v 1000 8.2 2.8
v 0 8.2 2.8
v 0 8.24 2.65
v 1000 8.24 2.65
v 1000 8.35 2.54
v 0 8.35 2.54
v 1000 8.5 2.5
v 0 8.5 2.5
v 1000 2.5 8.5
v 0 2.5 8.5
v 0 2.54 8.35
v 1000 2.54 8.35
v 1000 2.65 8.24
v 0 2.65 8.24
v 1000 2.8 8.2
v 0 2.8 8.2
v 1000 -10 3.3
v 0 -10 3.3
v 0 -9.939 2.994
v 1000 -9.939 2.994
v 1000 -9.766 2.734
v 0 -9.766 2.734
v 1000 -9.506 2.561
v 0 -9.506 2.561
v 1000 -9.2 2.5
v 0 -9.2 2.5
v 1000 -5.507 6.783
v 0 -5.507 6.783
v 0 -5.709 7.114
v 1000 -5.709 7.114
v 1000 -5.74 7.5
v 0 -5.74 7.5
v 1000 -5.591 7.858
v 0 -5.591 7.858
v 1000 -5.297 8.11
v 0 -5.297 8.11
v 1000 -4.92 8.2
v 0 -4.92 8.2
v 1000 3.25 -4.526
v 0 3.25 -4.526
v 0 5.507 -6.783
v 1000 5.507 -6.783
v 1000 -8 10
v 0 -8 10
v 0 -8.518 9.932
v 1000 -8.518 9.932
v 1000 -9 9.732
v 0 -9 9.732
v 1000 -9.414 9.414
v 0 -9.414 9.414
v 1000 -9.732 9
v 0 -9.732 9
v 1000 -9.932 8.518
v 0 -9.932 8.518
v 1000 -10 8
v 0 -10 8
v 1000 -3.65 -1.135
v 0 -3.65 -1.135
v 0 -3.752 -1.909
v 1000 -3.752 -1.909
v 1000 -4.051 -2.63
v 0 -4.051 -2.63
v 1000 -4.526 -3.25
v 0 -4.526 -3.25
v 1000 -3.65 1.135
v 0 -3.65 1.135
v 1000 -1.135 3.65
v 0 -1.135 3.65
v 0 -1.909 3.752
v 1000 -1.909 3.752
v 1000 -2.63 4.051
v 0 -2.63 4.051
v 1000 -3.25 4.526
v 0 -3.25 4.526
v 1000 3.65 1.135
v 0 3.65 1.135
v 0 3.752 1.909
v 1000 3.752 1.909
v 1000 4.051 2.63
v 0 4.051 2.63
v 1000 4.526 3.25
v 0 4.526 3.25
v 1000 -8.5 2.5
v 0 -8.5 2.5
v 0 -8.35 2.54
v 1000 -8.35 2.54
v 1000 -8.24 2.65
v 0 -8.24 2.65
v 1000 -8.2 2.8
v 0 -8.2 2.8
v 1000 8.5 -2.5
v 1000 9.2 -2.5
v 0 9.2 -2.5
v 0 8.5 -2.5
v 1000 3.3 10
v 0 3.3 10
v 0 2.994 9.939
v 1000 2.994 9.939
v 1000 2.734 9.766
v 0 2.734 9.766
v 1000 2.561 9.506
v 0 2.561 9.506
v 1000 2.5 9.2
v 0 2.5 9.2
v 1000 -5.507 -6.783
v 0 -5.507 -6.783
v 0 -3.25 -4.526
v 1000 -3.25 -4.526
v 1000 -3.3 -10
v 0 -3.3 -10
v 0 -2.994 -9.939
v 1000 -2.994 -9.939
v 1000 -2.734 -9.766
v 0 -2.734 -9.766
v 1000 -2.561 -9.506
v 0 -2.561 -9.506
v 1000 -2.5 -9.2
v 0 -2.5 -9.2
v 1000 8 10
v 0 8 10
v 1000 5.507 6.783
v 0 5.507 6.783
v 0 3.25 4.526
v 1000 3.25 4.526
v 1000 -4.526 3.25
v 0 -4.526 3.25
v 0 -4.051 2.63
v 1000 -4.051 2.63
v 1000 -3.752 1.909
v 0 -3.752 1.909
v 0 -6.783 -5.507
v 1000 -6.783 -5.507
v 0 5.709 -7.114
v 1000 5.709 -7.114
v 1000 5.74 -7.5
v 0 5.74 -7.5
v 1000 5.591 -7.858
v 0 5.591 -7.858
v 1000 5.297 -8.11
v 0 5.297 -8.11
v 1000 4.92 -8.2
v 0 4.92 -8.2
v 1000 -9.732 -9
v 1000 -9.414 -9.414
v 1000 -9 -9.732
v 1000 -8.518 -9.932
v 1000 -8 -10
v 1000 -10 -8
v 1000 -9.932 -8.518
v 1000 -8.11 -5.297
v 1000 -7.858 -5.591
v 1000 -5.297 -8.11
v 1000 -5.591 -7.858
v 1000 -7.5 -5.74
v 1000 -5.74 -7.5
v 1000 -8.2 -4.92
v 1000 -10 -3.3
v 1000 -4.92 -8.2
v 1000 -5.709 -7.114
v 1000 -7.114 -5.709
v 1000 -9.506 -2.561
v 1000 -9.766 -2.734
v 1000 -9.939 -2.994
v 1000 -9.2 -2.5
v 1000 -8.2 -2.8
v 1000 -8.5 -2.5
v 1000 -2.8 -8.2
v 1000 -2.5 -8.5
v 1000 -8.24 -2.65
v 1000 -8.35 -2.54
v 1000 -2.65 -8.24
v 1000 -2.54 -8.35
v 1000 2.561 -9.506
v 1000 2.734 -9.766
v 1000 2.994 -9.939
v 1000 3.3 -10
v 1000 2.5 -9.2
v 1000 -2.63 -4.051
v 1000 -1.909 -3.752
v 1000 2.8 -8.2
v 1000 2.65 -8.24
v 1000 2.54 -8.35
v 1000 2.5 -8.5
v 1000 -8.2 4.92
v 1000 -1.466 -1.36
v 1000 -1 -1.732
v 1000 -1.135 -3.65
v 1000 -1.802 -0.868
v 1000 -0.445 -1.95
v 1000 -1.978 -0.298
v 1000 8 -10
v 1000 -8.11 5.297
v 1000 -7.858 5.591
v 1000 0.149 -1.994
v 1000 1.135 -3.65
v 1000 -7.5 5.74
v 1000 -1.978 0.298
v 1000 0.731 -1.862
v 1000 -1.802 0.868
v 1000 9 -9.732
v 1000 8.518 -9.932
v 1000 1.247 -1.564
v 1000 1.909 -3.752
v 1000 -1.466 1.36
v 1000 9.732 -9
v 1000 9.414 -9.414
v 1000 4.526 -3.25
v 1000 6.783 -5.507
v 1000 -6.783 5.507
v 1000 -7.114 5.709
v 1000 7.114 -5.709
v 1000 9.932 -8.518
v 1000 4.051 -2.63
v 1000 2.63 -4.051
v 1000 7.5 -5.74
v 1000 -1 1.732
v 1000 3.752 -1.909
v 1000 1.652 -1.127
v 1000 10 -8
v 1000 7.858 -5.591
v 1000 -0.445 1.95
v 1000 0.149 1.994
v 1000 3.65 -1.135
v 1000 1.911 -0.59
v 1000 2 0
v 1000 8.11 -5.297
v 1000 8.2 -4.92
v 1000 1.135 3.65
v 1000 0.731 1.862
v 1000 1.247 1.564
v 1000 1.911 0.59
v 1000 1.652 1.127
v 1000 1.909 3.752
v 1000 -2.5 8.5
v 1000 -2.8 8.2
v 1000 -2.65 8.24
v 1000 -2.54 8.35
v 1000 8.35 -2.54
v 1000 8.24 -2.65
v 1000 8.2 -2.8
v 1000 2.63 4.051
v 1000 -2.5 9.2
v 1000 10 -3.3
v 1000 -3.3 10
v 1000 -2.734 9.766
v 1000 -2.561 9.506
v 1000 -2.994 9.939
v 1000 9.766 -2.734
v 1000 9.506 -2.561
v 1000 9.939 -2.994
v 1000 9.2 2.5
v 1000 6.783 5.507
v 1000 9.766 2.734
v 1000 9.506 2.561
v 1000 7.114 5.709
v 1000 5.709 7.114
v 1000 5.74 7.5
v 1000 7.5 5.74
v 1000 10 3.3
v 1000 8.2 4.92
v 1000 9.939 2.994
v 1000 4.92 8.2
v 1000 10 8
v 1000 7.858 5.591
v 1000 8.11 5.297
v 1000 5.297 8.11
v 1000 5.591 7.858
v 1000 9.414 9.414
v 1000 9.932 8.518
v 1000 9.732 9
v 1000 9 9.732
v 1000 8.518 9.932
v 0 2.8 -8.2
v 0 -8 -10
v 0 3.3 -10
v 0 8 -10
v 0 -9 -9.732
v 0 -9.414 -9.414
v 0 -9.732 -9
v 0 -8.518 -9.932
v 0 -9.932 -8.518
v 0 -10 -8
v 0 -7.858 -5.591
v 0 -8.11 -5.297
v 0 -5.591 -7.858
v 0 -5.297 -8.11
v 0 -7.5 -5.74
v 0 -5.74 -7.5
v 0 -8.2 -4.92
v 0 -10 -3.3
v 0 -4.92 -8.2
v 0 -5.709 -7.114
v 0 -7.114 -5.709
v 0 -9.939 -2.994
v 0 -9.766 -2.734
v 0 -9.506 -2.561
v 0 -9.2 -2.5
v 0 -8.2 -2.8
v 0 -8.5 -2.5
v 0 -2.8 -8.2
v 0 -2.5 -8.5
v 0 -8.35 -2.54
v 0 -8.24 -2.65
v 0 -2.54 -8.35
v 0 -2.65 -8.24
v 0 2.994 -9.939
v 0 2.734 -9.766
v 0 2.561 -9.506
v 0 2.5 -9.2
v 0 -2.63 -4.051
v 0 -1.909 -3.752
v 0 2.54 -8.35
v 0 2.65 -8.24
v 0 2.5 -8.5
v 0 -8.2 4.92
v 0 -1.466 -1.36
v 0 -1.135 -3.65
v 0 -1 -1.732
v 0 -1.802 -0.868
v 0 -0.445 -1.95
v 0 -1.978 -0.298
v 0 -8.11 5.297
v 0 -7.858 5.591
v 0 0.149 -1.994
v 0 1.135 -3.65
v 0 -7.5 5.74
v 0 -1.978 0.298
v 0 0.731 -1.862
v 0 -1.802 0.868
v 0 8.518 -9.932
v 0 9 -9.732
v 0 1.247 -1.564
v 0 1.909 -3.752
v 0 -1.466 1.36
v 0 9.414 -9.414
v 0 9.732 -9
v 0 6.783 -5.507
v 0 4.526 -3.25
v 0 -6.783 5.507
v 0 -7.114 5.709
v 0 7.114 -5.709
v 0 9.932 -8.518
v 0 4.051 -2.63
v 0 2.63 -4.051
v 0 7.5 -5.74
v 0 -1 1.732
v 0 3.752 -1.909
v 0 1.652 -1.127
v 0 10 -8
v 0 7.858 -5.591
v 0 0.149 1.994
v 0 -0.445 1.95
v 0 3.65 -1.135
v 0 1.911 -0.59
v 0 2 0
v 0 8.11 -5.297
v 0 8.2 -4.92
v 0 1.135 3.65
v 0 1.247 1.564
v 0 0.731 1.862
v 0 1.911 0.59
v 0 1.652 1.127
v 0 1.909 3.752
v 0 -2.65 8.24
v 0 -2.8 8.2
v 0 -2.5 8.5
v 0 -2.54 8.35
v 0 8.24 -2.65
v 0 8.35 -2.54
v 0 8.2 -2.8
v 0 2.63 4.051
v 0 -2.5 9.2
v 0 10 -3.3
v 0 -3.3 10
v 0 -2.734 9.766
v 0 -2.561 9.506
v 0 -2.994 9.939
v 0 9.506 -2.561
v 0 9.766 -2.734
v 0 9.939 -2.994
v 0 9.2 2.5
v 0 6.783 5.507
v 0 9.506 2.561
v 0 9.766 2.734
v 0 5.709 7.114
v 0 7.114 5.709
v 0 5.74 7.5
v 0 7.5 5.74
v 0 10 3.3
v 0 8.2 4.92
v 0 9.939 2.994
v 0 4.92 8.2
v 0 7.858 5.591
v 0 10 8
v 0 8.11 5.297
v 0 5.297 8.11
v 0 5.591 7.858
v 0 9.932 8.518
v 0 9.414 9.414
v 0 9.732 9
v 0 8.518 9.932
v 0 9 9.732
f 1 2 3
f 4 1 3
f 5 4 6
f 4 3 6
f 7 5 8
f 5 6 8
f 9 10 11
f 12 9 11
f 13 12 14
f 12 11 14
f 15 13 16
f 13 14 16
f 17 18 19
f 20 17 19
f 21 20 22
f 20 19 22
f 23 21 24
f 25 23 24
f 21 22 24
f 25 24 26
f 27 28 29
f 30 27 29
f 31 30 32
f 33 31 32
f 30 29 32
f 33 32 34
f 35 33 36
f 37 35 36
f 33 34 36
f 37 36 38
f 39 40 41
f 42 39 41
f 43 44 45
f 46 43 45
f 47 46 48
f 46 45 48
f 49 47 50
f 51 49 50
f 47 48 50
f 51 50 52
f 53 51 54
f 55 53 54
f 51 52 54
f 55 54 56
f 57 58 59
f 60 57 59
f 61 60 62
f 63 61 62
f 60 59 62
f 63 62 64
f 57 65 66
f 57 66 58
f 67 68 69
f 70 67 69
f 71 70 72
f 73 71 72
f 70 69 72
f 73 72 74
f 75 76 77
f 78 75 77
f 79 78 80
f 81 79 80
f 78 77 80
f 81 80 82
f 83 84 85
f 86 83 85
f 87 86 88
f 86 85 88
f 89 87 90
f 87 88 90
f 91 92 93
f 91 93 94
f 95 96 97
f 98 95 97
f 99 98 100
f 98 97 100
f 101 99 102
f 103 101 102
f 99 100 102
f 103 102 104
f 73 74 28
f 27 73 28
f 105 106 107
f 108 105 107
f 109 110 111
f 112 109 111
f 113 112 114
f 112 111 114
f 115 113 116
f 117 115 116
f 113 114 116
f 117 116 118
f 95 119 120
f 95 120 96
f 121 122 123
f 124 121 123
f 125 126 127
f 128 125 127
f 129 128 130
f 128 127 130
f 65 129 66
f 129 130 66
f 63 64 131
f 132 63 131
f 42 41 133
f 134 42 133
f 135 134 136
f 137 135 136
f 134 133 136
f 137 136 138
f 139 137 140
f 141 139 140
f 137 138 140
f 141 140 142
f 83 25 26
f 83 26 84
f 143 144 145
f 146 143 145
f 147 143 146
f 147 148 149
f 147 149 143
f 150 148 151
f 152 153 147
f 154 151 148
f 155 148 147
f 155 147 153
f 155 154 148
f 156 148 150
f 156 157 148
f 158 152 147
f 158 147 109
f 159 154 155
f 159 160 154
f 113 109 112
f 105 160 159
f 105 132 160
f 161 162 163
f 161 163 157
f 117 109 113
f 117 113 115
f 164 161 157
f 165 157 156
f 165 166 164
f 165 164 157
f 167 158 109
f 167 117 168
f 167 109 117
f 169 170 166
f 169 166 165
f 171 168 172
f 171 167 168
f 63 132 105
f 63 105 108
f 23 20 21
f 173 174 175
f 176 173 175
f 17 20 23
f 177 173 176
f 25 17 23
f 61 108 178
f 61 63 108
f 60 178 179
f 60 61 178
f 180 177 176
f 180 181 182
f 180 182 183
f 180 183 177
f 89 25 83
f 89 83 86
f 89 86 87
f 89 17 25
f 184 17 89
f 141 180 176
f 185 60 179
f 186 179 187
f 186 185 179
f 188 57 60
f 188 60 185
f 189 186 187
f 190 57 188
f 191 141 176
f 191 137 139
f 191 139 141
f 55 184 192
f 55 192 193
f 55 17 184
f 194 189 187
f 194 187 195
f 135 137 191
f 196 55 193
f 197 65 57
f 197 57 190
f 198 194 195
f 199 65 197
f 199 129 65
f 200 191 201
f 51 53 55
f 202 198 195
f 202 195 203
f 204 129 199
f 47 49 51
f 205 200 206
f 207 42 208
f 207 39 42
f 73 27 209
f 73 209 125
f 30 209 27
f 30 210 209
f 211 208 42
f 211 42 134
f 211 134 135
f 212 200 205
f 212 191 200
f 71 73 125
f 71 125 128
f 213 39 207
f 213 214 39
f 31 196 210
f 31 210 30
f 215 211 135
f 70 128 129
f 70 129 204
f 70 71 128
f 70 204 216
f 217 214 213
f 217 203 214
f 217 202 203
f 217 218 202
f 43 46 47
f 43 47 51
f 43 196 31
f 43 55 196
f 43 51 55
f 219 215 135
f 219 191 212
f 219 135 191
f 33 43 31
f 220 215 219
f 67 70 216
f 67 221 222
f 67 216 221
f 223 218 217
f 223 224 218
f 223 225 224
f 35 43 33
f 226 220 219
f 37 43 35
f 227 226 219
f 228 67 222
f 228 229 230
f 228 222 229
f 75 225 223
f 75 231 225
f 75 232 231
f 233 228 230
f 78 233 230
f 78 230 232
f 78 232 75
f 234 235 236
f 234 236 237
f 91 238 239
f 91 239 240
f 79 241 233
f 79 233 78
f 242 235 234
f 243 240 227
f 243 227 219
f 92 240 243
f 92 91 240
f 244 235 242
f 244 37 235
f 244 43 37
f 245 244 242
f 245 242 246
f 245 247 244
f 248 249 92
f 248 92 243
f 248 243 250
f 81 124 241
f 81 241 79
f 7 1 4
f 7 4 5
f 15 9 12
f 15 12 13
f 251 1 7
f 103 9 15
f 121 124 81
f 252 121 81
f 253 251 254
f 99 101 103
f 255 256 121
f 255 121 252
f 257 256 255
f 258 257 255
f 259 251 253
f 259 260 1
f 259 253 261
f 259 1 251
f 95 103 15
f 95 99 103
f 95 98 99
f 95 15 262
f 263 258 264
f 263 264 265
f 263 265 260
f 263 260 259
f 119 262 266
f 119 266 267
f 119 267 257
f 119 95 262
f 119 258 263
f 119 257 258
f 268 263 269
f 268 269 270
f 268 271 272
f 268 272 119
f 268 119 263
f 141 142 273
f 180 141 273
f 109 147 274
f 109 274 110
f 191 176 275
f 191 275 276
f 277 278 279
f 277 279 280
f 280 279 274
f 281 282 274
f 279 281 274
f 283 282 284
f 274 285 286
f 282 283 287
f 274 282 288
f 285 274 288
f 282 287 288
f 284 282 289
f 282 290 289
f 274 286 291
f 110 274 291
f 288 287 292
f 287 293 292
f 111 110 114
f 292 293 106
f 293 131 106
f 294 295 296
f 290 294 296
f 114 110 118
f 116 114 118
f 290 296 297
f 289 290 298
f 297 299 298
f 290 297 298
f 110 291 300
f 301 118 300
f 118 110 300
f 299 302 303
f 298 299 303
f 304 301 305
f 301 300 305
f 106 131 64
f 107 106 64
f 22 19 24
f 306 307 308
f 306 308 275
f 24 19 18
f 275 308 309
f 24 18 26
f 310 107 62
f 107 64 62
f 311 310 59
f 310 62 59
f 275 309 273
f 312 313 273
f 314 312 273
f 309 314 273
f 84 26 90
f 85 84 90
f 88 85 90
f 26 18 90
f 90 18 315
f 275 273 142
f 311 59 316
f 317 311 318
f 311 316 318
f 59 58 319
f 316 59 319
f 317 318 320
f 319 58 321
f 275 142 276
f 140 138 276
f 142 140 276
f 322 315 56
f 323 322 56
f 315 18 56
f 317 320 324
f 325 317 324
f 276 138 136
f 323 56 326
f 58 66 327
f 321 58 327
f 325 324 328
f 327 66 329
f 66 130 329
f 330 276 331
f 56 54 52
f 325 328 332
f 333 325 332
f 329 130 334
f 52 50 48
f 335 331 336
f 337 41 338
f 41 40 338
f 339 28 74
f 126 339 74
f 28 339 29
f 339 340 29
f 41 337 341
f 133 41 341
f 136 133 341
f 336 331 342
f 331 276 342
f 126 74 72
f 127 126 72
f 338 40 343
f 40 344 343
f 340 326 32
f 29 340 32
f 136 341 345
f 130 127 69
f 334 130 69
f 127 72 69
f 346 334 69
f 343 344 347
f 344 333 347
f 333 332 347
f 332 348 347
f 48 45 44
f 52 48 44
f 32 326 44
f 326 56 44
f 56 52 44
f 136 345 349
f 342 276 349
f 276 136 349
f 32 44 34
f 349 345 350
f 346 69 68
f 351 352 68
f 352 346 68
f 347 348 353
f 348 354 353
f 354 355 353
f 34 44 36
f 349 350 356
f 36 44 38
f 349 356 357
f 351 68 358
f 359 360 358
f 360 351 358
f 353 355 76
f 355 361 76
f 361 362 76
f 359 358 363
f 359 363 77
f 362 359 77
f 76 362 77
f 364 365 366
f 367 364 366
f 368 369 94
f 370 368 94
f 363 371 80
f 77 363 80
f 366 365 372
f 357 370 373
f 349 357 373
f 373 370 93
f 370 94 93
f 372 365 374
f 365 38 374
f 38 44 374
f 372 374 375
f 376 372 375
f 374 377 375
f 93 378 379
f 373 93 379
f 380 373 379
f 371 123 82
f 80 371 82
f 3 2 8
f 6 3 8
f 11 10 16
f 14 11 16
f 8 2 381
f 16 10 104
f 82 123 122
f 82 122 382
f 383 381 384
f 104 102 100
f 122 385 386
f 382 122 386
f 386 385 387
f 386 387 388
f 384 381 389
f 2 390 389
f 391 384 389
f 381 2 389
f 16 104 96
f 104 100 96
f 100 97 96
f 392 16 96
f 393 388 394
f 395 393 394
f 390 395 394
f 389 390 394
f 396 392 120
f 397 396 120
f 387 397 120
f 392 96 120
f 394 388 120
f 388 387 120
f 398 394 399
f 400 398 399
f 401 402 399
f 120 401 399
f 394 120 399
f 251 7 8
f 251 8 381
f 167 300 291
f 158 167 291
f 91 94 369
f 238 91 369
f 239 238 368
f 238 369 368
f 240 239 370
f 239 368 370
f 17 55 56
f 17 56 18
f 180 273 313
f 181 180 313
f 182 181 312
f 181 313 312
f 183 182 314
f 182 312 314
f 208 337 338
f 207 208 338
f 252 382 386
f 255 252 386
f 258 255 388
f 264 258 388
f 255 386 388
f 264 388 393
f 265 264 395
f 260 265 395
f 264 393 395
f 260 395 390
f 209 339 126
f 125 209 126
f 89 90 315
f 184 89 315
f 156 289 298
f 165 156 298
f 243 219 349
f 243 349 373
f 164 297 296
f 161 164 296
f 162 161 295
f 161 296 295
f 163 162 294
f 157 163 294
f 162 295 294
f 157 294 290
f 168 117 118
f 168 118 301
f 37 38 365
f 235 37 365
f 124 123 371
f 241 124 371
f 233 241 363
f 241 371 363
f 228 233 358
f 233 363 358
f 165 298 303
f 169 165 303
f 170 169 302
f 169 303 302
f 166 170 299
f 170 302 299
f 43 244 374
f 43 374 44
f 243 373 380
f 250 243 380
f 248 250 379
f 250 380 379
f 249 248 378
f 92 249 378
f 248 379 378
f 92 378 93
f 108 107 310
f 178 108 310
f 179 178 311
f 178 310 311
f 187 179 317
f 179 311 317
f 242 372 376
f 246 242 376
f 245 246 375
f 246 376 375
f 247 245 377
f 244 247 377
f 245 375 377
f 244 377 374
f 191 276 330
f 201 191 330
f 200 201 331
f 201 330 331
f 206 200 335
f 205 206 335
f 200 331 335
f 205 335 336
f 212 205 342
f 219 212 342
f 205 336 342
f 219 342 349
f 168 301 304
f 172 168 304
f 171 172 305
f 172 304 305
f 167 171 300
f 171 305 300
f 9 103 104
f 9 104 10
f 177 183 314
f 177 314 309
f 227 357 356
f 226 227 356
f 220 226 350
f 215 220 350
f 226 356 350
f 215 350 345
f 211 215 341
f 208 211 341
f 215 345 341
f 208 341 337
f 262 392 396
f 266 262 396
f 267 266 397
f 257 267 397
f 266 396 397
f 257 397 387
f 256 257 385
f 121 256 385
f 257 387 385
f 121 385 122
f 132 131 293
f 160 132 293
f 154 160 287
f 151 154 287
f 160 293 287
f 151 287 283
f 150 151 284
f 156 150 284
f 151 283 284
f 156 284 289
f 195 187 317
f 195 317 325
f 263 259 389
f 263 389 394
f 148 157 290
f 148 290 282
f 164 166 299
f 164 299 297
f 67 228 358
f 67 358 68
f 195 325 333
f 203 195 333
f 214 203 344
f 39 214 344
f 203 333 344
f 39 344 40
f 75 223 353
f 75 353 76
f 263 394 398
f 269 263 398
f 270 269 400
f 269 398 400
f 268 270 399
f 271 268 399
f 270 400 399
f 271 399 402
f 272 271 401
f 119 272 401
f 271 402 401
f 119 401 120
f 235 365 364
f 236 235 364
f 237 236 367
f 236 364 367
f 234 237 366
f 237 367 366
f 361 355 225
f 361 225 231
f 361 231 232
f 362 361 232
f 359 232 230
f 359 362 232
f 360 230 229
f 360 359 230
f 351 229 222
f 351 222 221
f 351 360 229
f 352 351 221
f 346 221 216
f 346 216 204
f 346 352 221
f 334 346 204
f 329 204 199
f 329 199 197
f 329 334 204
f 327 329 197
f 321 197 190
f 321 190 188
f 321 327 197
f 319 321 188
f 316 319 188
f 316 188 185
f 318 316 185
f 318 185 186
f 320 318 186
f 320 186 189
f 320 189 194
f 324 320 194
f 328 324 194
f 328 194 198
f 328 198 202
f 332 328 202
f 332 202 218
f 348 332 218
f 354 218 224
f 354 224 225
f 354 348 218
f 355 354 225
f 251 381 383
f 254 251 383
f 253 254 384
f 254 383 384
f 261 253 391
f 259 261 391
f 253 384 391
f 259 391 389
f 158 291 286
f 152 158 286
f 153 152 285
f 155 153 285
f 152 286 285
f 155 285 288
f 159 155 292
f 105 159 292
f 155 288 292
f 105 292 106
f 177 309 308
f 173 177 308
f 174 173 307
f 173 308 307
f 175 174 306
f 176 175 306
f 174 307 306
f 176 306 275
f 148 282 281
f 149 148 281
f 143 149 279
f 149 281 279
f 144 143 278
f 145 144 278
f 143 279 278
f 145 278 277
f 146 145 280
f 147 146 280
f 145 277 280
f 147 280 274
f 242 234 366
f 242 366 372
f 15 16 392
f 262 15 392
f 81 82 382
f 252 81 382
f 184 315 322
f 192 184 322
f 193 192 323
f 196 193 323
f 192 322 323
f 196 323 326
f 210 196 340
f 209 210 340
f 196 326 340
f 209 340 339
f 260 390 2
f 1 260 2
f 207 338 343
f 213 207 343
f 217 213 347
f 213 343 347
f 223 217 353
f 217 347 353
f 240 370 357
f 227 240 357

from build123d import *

# Parameters (mm, degrees)
F0_R     = 2
F1_DEPTH = 1000


with BuildPart() as f1:
    # F0 (on Right) → F1 (new body)
    with BuildSketch(Plane.YZ):
        with BuildLine():
            Line((-3.3, 10), (-8, 10))
            ThreePointArc((-8, 10), (-9.414214, 9.414214), (-10, 8))
            Line((-10, 8), (-10, 3.3))
            ThreePointArc((-10, 3.3), (-9.765685, 2.734315), (-9.2, 2.5))
            Line((-9.2, 2.5), (-8.5, 2.5))
            ThreePointArc((-8.5, 2.5), (-8.287868, 2.587868), (-8.2, 2.8))
            Line((-8.2, 2.8), (-8.2, 4.92))
            ThreePointArc((-8.2, 4.92), (-7.687627, 5.68682), (-6.783101, 5.506899))
            Line((-6.783101, 5.506899), (-4.525962, 3.249759))
            ThreePointArc((-4.525962, 3.249759), (-3.877655, 2.279499), (-3.65, 1.135))
            Line((-3.65, 1.135), (-3.65, -1.135))
            ThreePointArc((-3.65, -1.135), (-3.877655, -2.279499), (-4.525962, -3.249759))
            Line((-4.525962, -3.249759), (-6.783101, -5.506899))
            ThreePointArc((-6.783101, -5.506899), (-7.687627, -5.68682), (-8.2, -4.92))
            Line((-8.2, -4.92), (-8.2, -2.8))
            ThreePointArc((-8.2, -2.8), (-8.287868, -2.587868), (-8.5, -2.5))
            Line((-8.5, -2.5), (-9.2, -2.5))
            ThreePointArc((-9.2, -2.5), (-9.765685, -2.734315), (-10, -3.3))
            Line((-10, -3.3), (-10, -8))
            ThreePointArc((-10, -8), (-9.414214, -9.414214), (-8, -10))
            Line((-8, -10), (-3.3, -10))
            ThreePointArc((-3.3, -10), (-2.734315, -9.765685), (-2.5, -9.2))
            Line((-2.5, -9.2), (-2.5, -8.5))
            ThreePointArc((-2.5, -8.5), (-2.587868, -8.287868), (-2.8, -8.2))
            Line((-2.8, -8.2), (-4.92, -8.2))
            ThreePointArc((-4.92, -8.2), (-5.68682, -7.687627), (-5.506899, -6.783101))
            Line((-5.506899, -6.783101), (-3.249759, -4.525962))
            ThreePointArc((-3.249759, -4.525962), (-2.279499, -3.877655), (-1.135, -3.65))
            Line((-1.135, -3.65), (1.135, -3.65))
            ThreePointArc((1.135, -3.65), (2.279499, -3.877655), (3.249759, -4.525962))
            Line((3.249759, -4.525962), (5.506899, -6.783101))
            ThreePointArc((5.506899, -6.783101), (5.68682, -7.687627), (4.92, -8.2))
            Line((4.92, -8.2), (2.8, -8.2))
            ThreePointArc((2.8, -8.2), (2.587868, -8.287868), (2.5, -8.5))
            Line((2.5, -8.5), (2.5, -9.2))
            ThreePointArc((2.5, -9.2), (2.734315, -9.765685), (3.3, -10))
            Line((3.3, -10), (8, -10))
            ThreePointArc((8, -10), (9.414214, -9.414214), (10, -8))
            Line((10, -8), (10, -3.3))
            ThreePointArc((10, -3.3), (9.765685, -2.734315), (9.2, -2.5))
            Line((9.2, -2.5), (8.5, -2.5))
            ThreePointArc((8.5, -2.5), (8.287868, -2.587868), (8.2, -2.8))
            Line((8.2, -2.8), (8.2, -4.92))
            ThreePointArc((8.2, -4.92), (7.687627, -5.68682), (6.783101, -5.506899))
            Line((6.783101, -5.506899), (4.525962, -3.249759))
            ThreePointArc((4.525962, -3.249759), (3.877655, -2.279499), (3.65, -1.135))
            Line((3.65, -1.135), (3.65, 1.135))
            ThreePointArc((3.65, 1.135), (3.877655, 2.279499), (4.525962, 3.249759))
            Line((4.525962, 3.249759), (6.783101, 5.506899))
            ThreePointArc((6.783101, 5.506899), (7.687627, 5.68682), (8.2, 4.92))
            Line((8.2, 4.92), (8.2, 2.8))
            ThreePointArc((8.2, 2.8), (8.287868, 2.587868), (8.5, 2.5))
            Line((8.5, 2.5), (9.2, 2.5))
            ThreePointArc((9.2, 2.5), (9.765685, 2.734315), (10, 3.3))
            Line((10, 3.3), (10, 8))
            ThreePointArc((10, 8), (9.414214, 9.414214), (8, 10))
            Line((8, 10), (3.3, 10))
            ThreePointArc((3.3, 10), (2.734315, 9.765685), (2.5, 9.2))
            Line((2.5, 9.2), (2.5, 8.5))
            ThreePointArc((2.5, 8.5), (2.587868, 8.287868), (2.8, 8.2))
            Line((2.8, 8.2), (4.92, 8.2))
            ThreePointArc((4.92, 8.2), (5.68682, 7.687627), (5.506899, 6.783101))
            Line((5.506899, 6.783101), (3.249759, 4.525962))
            ThreePointArc((3.249759, 4.525962), (2.279499, 3.877655), (1.135, 3.65))
            Line((1.135, 3.65), (-1.135, 3.65))
            ThreePointArc((-1.135, 3.65), (-2.279499, 3.877655), (-3.249759, 4.525962))
            Line((-3.249759, 4.525962), (-5.506899, 6.783101))
            ThreePointArc((-5.506899, 6.783101), (-5.68682, 7.687627), (-4.92, 8.2))
            Line((-4.92, 8.2), (-2.8, 8.2))
            ThreePointArc((-2.8, 8.2), (-2.587868, 8.287868), (-2.5, 8.5))
            Line((-2.5, 8.5), (-2.5, 9.2))
            ThreePointArc((-2.5, 9.2), (-2.734315, 9.765685), (-3.3, 10))
        make_face()
        Circle(F0_R, mode=Mode.SUBTRACT)
    extrude(amount=F1_DEPTH)


solid = f1.part
